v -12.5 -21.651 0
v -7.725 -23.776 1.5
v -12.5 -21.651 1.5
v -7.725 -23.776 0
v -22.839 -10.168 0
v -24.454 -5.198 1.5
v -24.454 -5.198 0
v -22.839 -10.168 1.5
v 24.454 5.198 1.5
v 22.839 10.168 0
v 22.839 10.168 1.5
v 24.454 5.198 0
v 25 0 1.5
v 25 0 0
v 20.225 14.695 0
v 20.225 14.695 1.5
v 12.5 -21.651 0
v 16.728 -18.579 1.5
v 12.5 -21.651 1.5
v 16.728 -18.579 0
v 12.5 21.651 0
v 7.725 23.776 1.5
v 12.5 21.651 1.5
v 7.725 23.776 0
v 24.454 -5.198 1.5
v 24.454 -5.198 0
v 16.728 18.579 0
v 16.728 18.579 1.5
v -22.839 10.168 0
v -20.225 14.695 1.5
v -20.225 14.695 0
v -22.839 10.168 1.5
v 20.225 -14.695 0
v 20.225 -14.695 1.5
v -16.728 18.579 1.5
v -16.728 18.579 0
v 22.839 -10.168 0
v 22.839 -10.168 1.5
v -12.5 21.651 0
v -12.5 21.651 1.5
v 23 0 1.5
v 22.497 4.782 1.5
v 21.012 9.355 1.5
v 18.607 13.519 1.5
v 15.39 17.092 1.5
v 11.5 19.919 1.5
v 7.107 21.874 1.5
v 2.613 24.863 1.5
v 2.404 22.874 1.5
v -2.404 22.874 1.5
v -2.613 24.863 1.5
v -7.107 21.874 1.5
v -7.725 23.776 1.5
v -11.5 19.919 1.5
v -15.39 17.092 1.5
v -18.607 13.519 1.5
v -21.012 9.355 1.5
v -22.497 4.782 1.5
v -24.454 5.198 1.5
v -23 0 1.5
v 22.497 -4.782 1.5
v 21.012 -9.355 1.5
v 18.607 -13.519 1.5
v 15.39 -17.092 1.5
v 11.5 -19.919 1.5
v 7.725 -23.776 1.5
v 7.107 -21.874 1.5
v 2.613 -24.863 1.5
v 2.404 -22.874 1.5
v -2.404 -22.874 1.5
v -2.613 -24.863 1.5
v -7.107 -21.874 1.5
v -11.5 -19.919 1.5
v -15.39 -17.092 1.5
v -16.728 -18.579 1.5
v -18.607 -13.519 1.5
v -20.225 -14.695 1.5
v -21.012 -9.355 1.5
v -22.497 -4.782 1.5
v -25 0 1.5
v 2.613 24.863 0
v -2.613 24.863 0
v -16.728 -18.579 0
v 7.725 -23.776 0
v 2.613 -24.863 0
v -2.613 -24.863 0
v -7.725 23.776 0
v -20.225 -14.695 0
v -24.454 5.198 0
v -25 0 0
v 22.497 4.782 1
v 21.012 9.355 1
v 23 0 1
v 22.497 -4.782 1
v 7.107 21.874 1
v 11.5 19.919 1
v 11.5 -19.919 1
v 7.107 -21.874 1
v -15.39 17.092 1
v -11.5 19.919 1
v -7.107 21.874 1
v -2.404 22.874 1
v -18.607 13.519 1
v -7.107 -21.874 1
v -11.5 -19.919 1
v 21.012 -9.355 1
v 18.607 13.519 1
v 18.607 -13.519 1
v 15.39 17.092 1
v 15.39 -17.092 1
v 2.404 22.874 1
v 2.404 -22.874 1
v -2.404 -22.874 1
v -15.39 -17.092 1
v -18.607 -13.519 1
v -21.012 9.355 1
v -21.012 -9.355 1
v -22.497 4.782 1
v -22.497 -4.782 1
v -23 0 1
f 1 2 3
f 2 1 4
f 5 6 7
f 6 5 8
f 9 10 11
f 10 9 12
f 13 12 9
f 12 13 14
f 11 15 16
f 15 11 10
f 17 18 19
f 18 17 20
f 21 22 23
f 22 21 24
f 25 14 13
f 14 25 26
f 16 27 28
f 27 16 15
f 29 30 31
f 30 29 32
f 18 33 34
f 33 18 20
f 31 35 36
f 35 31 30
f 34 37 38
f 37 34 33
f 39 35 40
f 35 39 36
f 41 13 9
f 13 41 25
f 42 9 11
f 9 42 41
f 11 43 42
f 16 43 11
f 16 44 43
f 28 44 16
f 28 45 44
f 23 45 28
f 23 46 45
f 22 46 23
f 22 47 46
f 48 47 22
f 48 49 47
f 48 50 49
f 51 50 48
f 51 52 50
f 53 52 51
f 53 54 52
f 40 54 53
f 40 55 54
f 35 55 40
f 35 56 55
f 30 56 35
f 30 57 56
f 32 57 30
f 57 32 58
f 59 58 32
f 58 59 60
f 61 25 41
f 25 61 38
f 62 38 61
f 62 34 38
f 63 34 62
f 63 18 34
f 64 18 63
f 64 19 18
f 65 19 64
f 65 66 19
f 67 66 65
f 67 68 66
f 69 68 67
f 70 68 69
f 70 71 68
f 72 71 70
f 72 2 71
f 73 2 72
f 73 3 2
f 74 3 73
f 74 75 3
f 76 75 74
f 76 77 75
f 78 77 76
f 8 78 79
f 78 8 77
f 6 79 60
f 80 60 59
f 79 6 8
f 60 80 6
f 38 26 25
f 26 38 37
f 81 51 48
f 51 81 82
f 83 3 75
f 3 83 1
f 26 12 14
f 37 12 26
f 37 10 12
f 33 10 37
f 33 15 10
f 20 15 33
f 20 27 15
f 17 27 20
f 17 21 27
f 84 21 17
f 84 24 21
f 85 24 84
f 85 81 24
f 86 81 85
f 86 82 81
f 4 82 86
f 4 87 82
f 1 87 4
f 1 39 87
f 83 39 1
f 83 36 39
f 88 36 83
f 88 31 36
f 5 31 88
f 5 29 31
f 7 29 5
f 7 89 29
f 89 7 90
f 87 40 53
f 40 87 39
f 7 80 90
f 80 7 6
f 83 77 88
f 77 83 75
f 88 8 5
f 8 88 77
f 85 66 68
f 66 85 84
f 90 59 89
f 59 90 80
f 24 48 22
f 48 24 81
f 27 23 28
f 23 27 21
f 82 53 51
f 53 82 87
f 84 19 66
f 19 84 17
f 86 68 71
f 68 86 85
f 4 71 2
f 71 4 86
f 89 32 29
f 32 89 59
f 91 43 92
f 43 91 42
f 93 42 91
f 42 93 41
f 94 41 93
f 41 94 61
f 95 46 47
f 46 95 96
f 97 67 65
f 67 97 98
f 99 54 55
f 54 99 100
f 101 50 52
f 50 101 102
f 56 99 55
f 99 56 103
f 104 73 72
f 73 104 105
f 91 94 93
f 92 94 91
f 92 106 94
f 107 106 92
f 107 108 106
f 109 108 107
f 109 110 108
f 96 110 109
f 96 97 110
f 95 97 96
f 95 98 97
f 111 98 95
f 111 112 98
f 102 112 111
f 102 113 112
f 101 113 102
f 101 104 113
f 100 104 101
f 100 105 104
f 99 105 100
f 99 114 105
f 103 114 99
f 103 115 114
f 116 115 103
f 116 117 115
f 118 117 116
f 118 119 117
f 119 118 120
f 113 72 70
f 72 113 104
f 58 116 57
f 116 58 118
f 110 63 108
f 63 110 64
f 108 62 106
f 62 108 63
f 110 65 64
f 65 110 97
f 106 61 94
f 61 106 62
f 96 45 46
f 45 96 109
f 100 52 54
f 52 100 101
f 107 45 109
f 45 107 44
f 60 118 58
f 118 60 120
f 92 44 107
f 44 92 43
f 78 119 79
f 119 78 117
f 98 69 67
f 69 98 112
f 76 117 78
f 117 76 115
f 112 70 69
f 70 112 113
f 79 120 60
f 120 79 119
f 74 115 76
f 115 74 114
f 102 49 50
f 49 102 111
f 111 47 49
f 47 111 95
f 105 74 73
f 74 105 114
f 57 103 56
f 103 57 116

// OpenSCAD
radius = 25;
wall = 2;

difference() {
    cylinder(1.5, radius, radius);
    translate([0, 0, 1]) cylinder(1, radius - wall, radius - wall);
}
